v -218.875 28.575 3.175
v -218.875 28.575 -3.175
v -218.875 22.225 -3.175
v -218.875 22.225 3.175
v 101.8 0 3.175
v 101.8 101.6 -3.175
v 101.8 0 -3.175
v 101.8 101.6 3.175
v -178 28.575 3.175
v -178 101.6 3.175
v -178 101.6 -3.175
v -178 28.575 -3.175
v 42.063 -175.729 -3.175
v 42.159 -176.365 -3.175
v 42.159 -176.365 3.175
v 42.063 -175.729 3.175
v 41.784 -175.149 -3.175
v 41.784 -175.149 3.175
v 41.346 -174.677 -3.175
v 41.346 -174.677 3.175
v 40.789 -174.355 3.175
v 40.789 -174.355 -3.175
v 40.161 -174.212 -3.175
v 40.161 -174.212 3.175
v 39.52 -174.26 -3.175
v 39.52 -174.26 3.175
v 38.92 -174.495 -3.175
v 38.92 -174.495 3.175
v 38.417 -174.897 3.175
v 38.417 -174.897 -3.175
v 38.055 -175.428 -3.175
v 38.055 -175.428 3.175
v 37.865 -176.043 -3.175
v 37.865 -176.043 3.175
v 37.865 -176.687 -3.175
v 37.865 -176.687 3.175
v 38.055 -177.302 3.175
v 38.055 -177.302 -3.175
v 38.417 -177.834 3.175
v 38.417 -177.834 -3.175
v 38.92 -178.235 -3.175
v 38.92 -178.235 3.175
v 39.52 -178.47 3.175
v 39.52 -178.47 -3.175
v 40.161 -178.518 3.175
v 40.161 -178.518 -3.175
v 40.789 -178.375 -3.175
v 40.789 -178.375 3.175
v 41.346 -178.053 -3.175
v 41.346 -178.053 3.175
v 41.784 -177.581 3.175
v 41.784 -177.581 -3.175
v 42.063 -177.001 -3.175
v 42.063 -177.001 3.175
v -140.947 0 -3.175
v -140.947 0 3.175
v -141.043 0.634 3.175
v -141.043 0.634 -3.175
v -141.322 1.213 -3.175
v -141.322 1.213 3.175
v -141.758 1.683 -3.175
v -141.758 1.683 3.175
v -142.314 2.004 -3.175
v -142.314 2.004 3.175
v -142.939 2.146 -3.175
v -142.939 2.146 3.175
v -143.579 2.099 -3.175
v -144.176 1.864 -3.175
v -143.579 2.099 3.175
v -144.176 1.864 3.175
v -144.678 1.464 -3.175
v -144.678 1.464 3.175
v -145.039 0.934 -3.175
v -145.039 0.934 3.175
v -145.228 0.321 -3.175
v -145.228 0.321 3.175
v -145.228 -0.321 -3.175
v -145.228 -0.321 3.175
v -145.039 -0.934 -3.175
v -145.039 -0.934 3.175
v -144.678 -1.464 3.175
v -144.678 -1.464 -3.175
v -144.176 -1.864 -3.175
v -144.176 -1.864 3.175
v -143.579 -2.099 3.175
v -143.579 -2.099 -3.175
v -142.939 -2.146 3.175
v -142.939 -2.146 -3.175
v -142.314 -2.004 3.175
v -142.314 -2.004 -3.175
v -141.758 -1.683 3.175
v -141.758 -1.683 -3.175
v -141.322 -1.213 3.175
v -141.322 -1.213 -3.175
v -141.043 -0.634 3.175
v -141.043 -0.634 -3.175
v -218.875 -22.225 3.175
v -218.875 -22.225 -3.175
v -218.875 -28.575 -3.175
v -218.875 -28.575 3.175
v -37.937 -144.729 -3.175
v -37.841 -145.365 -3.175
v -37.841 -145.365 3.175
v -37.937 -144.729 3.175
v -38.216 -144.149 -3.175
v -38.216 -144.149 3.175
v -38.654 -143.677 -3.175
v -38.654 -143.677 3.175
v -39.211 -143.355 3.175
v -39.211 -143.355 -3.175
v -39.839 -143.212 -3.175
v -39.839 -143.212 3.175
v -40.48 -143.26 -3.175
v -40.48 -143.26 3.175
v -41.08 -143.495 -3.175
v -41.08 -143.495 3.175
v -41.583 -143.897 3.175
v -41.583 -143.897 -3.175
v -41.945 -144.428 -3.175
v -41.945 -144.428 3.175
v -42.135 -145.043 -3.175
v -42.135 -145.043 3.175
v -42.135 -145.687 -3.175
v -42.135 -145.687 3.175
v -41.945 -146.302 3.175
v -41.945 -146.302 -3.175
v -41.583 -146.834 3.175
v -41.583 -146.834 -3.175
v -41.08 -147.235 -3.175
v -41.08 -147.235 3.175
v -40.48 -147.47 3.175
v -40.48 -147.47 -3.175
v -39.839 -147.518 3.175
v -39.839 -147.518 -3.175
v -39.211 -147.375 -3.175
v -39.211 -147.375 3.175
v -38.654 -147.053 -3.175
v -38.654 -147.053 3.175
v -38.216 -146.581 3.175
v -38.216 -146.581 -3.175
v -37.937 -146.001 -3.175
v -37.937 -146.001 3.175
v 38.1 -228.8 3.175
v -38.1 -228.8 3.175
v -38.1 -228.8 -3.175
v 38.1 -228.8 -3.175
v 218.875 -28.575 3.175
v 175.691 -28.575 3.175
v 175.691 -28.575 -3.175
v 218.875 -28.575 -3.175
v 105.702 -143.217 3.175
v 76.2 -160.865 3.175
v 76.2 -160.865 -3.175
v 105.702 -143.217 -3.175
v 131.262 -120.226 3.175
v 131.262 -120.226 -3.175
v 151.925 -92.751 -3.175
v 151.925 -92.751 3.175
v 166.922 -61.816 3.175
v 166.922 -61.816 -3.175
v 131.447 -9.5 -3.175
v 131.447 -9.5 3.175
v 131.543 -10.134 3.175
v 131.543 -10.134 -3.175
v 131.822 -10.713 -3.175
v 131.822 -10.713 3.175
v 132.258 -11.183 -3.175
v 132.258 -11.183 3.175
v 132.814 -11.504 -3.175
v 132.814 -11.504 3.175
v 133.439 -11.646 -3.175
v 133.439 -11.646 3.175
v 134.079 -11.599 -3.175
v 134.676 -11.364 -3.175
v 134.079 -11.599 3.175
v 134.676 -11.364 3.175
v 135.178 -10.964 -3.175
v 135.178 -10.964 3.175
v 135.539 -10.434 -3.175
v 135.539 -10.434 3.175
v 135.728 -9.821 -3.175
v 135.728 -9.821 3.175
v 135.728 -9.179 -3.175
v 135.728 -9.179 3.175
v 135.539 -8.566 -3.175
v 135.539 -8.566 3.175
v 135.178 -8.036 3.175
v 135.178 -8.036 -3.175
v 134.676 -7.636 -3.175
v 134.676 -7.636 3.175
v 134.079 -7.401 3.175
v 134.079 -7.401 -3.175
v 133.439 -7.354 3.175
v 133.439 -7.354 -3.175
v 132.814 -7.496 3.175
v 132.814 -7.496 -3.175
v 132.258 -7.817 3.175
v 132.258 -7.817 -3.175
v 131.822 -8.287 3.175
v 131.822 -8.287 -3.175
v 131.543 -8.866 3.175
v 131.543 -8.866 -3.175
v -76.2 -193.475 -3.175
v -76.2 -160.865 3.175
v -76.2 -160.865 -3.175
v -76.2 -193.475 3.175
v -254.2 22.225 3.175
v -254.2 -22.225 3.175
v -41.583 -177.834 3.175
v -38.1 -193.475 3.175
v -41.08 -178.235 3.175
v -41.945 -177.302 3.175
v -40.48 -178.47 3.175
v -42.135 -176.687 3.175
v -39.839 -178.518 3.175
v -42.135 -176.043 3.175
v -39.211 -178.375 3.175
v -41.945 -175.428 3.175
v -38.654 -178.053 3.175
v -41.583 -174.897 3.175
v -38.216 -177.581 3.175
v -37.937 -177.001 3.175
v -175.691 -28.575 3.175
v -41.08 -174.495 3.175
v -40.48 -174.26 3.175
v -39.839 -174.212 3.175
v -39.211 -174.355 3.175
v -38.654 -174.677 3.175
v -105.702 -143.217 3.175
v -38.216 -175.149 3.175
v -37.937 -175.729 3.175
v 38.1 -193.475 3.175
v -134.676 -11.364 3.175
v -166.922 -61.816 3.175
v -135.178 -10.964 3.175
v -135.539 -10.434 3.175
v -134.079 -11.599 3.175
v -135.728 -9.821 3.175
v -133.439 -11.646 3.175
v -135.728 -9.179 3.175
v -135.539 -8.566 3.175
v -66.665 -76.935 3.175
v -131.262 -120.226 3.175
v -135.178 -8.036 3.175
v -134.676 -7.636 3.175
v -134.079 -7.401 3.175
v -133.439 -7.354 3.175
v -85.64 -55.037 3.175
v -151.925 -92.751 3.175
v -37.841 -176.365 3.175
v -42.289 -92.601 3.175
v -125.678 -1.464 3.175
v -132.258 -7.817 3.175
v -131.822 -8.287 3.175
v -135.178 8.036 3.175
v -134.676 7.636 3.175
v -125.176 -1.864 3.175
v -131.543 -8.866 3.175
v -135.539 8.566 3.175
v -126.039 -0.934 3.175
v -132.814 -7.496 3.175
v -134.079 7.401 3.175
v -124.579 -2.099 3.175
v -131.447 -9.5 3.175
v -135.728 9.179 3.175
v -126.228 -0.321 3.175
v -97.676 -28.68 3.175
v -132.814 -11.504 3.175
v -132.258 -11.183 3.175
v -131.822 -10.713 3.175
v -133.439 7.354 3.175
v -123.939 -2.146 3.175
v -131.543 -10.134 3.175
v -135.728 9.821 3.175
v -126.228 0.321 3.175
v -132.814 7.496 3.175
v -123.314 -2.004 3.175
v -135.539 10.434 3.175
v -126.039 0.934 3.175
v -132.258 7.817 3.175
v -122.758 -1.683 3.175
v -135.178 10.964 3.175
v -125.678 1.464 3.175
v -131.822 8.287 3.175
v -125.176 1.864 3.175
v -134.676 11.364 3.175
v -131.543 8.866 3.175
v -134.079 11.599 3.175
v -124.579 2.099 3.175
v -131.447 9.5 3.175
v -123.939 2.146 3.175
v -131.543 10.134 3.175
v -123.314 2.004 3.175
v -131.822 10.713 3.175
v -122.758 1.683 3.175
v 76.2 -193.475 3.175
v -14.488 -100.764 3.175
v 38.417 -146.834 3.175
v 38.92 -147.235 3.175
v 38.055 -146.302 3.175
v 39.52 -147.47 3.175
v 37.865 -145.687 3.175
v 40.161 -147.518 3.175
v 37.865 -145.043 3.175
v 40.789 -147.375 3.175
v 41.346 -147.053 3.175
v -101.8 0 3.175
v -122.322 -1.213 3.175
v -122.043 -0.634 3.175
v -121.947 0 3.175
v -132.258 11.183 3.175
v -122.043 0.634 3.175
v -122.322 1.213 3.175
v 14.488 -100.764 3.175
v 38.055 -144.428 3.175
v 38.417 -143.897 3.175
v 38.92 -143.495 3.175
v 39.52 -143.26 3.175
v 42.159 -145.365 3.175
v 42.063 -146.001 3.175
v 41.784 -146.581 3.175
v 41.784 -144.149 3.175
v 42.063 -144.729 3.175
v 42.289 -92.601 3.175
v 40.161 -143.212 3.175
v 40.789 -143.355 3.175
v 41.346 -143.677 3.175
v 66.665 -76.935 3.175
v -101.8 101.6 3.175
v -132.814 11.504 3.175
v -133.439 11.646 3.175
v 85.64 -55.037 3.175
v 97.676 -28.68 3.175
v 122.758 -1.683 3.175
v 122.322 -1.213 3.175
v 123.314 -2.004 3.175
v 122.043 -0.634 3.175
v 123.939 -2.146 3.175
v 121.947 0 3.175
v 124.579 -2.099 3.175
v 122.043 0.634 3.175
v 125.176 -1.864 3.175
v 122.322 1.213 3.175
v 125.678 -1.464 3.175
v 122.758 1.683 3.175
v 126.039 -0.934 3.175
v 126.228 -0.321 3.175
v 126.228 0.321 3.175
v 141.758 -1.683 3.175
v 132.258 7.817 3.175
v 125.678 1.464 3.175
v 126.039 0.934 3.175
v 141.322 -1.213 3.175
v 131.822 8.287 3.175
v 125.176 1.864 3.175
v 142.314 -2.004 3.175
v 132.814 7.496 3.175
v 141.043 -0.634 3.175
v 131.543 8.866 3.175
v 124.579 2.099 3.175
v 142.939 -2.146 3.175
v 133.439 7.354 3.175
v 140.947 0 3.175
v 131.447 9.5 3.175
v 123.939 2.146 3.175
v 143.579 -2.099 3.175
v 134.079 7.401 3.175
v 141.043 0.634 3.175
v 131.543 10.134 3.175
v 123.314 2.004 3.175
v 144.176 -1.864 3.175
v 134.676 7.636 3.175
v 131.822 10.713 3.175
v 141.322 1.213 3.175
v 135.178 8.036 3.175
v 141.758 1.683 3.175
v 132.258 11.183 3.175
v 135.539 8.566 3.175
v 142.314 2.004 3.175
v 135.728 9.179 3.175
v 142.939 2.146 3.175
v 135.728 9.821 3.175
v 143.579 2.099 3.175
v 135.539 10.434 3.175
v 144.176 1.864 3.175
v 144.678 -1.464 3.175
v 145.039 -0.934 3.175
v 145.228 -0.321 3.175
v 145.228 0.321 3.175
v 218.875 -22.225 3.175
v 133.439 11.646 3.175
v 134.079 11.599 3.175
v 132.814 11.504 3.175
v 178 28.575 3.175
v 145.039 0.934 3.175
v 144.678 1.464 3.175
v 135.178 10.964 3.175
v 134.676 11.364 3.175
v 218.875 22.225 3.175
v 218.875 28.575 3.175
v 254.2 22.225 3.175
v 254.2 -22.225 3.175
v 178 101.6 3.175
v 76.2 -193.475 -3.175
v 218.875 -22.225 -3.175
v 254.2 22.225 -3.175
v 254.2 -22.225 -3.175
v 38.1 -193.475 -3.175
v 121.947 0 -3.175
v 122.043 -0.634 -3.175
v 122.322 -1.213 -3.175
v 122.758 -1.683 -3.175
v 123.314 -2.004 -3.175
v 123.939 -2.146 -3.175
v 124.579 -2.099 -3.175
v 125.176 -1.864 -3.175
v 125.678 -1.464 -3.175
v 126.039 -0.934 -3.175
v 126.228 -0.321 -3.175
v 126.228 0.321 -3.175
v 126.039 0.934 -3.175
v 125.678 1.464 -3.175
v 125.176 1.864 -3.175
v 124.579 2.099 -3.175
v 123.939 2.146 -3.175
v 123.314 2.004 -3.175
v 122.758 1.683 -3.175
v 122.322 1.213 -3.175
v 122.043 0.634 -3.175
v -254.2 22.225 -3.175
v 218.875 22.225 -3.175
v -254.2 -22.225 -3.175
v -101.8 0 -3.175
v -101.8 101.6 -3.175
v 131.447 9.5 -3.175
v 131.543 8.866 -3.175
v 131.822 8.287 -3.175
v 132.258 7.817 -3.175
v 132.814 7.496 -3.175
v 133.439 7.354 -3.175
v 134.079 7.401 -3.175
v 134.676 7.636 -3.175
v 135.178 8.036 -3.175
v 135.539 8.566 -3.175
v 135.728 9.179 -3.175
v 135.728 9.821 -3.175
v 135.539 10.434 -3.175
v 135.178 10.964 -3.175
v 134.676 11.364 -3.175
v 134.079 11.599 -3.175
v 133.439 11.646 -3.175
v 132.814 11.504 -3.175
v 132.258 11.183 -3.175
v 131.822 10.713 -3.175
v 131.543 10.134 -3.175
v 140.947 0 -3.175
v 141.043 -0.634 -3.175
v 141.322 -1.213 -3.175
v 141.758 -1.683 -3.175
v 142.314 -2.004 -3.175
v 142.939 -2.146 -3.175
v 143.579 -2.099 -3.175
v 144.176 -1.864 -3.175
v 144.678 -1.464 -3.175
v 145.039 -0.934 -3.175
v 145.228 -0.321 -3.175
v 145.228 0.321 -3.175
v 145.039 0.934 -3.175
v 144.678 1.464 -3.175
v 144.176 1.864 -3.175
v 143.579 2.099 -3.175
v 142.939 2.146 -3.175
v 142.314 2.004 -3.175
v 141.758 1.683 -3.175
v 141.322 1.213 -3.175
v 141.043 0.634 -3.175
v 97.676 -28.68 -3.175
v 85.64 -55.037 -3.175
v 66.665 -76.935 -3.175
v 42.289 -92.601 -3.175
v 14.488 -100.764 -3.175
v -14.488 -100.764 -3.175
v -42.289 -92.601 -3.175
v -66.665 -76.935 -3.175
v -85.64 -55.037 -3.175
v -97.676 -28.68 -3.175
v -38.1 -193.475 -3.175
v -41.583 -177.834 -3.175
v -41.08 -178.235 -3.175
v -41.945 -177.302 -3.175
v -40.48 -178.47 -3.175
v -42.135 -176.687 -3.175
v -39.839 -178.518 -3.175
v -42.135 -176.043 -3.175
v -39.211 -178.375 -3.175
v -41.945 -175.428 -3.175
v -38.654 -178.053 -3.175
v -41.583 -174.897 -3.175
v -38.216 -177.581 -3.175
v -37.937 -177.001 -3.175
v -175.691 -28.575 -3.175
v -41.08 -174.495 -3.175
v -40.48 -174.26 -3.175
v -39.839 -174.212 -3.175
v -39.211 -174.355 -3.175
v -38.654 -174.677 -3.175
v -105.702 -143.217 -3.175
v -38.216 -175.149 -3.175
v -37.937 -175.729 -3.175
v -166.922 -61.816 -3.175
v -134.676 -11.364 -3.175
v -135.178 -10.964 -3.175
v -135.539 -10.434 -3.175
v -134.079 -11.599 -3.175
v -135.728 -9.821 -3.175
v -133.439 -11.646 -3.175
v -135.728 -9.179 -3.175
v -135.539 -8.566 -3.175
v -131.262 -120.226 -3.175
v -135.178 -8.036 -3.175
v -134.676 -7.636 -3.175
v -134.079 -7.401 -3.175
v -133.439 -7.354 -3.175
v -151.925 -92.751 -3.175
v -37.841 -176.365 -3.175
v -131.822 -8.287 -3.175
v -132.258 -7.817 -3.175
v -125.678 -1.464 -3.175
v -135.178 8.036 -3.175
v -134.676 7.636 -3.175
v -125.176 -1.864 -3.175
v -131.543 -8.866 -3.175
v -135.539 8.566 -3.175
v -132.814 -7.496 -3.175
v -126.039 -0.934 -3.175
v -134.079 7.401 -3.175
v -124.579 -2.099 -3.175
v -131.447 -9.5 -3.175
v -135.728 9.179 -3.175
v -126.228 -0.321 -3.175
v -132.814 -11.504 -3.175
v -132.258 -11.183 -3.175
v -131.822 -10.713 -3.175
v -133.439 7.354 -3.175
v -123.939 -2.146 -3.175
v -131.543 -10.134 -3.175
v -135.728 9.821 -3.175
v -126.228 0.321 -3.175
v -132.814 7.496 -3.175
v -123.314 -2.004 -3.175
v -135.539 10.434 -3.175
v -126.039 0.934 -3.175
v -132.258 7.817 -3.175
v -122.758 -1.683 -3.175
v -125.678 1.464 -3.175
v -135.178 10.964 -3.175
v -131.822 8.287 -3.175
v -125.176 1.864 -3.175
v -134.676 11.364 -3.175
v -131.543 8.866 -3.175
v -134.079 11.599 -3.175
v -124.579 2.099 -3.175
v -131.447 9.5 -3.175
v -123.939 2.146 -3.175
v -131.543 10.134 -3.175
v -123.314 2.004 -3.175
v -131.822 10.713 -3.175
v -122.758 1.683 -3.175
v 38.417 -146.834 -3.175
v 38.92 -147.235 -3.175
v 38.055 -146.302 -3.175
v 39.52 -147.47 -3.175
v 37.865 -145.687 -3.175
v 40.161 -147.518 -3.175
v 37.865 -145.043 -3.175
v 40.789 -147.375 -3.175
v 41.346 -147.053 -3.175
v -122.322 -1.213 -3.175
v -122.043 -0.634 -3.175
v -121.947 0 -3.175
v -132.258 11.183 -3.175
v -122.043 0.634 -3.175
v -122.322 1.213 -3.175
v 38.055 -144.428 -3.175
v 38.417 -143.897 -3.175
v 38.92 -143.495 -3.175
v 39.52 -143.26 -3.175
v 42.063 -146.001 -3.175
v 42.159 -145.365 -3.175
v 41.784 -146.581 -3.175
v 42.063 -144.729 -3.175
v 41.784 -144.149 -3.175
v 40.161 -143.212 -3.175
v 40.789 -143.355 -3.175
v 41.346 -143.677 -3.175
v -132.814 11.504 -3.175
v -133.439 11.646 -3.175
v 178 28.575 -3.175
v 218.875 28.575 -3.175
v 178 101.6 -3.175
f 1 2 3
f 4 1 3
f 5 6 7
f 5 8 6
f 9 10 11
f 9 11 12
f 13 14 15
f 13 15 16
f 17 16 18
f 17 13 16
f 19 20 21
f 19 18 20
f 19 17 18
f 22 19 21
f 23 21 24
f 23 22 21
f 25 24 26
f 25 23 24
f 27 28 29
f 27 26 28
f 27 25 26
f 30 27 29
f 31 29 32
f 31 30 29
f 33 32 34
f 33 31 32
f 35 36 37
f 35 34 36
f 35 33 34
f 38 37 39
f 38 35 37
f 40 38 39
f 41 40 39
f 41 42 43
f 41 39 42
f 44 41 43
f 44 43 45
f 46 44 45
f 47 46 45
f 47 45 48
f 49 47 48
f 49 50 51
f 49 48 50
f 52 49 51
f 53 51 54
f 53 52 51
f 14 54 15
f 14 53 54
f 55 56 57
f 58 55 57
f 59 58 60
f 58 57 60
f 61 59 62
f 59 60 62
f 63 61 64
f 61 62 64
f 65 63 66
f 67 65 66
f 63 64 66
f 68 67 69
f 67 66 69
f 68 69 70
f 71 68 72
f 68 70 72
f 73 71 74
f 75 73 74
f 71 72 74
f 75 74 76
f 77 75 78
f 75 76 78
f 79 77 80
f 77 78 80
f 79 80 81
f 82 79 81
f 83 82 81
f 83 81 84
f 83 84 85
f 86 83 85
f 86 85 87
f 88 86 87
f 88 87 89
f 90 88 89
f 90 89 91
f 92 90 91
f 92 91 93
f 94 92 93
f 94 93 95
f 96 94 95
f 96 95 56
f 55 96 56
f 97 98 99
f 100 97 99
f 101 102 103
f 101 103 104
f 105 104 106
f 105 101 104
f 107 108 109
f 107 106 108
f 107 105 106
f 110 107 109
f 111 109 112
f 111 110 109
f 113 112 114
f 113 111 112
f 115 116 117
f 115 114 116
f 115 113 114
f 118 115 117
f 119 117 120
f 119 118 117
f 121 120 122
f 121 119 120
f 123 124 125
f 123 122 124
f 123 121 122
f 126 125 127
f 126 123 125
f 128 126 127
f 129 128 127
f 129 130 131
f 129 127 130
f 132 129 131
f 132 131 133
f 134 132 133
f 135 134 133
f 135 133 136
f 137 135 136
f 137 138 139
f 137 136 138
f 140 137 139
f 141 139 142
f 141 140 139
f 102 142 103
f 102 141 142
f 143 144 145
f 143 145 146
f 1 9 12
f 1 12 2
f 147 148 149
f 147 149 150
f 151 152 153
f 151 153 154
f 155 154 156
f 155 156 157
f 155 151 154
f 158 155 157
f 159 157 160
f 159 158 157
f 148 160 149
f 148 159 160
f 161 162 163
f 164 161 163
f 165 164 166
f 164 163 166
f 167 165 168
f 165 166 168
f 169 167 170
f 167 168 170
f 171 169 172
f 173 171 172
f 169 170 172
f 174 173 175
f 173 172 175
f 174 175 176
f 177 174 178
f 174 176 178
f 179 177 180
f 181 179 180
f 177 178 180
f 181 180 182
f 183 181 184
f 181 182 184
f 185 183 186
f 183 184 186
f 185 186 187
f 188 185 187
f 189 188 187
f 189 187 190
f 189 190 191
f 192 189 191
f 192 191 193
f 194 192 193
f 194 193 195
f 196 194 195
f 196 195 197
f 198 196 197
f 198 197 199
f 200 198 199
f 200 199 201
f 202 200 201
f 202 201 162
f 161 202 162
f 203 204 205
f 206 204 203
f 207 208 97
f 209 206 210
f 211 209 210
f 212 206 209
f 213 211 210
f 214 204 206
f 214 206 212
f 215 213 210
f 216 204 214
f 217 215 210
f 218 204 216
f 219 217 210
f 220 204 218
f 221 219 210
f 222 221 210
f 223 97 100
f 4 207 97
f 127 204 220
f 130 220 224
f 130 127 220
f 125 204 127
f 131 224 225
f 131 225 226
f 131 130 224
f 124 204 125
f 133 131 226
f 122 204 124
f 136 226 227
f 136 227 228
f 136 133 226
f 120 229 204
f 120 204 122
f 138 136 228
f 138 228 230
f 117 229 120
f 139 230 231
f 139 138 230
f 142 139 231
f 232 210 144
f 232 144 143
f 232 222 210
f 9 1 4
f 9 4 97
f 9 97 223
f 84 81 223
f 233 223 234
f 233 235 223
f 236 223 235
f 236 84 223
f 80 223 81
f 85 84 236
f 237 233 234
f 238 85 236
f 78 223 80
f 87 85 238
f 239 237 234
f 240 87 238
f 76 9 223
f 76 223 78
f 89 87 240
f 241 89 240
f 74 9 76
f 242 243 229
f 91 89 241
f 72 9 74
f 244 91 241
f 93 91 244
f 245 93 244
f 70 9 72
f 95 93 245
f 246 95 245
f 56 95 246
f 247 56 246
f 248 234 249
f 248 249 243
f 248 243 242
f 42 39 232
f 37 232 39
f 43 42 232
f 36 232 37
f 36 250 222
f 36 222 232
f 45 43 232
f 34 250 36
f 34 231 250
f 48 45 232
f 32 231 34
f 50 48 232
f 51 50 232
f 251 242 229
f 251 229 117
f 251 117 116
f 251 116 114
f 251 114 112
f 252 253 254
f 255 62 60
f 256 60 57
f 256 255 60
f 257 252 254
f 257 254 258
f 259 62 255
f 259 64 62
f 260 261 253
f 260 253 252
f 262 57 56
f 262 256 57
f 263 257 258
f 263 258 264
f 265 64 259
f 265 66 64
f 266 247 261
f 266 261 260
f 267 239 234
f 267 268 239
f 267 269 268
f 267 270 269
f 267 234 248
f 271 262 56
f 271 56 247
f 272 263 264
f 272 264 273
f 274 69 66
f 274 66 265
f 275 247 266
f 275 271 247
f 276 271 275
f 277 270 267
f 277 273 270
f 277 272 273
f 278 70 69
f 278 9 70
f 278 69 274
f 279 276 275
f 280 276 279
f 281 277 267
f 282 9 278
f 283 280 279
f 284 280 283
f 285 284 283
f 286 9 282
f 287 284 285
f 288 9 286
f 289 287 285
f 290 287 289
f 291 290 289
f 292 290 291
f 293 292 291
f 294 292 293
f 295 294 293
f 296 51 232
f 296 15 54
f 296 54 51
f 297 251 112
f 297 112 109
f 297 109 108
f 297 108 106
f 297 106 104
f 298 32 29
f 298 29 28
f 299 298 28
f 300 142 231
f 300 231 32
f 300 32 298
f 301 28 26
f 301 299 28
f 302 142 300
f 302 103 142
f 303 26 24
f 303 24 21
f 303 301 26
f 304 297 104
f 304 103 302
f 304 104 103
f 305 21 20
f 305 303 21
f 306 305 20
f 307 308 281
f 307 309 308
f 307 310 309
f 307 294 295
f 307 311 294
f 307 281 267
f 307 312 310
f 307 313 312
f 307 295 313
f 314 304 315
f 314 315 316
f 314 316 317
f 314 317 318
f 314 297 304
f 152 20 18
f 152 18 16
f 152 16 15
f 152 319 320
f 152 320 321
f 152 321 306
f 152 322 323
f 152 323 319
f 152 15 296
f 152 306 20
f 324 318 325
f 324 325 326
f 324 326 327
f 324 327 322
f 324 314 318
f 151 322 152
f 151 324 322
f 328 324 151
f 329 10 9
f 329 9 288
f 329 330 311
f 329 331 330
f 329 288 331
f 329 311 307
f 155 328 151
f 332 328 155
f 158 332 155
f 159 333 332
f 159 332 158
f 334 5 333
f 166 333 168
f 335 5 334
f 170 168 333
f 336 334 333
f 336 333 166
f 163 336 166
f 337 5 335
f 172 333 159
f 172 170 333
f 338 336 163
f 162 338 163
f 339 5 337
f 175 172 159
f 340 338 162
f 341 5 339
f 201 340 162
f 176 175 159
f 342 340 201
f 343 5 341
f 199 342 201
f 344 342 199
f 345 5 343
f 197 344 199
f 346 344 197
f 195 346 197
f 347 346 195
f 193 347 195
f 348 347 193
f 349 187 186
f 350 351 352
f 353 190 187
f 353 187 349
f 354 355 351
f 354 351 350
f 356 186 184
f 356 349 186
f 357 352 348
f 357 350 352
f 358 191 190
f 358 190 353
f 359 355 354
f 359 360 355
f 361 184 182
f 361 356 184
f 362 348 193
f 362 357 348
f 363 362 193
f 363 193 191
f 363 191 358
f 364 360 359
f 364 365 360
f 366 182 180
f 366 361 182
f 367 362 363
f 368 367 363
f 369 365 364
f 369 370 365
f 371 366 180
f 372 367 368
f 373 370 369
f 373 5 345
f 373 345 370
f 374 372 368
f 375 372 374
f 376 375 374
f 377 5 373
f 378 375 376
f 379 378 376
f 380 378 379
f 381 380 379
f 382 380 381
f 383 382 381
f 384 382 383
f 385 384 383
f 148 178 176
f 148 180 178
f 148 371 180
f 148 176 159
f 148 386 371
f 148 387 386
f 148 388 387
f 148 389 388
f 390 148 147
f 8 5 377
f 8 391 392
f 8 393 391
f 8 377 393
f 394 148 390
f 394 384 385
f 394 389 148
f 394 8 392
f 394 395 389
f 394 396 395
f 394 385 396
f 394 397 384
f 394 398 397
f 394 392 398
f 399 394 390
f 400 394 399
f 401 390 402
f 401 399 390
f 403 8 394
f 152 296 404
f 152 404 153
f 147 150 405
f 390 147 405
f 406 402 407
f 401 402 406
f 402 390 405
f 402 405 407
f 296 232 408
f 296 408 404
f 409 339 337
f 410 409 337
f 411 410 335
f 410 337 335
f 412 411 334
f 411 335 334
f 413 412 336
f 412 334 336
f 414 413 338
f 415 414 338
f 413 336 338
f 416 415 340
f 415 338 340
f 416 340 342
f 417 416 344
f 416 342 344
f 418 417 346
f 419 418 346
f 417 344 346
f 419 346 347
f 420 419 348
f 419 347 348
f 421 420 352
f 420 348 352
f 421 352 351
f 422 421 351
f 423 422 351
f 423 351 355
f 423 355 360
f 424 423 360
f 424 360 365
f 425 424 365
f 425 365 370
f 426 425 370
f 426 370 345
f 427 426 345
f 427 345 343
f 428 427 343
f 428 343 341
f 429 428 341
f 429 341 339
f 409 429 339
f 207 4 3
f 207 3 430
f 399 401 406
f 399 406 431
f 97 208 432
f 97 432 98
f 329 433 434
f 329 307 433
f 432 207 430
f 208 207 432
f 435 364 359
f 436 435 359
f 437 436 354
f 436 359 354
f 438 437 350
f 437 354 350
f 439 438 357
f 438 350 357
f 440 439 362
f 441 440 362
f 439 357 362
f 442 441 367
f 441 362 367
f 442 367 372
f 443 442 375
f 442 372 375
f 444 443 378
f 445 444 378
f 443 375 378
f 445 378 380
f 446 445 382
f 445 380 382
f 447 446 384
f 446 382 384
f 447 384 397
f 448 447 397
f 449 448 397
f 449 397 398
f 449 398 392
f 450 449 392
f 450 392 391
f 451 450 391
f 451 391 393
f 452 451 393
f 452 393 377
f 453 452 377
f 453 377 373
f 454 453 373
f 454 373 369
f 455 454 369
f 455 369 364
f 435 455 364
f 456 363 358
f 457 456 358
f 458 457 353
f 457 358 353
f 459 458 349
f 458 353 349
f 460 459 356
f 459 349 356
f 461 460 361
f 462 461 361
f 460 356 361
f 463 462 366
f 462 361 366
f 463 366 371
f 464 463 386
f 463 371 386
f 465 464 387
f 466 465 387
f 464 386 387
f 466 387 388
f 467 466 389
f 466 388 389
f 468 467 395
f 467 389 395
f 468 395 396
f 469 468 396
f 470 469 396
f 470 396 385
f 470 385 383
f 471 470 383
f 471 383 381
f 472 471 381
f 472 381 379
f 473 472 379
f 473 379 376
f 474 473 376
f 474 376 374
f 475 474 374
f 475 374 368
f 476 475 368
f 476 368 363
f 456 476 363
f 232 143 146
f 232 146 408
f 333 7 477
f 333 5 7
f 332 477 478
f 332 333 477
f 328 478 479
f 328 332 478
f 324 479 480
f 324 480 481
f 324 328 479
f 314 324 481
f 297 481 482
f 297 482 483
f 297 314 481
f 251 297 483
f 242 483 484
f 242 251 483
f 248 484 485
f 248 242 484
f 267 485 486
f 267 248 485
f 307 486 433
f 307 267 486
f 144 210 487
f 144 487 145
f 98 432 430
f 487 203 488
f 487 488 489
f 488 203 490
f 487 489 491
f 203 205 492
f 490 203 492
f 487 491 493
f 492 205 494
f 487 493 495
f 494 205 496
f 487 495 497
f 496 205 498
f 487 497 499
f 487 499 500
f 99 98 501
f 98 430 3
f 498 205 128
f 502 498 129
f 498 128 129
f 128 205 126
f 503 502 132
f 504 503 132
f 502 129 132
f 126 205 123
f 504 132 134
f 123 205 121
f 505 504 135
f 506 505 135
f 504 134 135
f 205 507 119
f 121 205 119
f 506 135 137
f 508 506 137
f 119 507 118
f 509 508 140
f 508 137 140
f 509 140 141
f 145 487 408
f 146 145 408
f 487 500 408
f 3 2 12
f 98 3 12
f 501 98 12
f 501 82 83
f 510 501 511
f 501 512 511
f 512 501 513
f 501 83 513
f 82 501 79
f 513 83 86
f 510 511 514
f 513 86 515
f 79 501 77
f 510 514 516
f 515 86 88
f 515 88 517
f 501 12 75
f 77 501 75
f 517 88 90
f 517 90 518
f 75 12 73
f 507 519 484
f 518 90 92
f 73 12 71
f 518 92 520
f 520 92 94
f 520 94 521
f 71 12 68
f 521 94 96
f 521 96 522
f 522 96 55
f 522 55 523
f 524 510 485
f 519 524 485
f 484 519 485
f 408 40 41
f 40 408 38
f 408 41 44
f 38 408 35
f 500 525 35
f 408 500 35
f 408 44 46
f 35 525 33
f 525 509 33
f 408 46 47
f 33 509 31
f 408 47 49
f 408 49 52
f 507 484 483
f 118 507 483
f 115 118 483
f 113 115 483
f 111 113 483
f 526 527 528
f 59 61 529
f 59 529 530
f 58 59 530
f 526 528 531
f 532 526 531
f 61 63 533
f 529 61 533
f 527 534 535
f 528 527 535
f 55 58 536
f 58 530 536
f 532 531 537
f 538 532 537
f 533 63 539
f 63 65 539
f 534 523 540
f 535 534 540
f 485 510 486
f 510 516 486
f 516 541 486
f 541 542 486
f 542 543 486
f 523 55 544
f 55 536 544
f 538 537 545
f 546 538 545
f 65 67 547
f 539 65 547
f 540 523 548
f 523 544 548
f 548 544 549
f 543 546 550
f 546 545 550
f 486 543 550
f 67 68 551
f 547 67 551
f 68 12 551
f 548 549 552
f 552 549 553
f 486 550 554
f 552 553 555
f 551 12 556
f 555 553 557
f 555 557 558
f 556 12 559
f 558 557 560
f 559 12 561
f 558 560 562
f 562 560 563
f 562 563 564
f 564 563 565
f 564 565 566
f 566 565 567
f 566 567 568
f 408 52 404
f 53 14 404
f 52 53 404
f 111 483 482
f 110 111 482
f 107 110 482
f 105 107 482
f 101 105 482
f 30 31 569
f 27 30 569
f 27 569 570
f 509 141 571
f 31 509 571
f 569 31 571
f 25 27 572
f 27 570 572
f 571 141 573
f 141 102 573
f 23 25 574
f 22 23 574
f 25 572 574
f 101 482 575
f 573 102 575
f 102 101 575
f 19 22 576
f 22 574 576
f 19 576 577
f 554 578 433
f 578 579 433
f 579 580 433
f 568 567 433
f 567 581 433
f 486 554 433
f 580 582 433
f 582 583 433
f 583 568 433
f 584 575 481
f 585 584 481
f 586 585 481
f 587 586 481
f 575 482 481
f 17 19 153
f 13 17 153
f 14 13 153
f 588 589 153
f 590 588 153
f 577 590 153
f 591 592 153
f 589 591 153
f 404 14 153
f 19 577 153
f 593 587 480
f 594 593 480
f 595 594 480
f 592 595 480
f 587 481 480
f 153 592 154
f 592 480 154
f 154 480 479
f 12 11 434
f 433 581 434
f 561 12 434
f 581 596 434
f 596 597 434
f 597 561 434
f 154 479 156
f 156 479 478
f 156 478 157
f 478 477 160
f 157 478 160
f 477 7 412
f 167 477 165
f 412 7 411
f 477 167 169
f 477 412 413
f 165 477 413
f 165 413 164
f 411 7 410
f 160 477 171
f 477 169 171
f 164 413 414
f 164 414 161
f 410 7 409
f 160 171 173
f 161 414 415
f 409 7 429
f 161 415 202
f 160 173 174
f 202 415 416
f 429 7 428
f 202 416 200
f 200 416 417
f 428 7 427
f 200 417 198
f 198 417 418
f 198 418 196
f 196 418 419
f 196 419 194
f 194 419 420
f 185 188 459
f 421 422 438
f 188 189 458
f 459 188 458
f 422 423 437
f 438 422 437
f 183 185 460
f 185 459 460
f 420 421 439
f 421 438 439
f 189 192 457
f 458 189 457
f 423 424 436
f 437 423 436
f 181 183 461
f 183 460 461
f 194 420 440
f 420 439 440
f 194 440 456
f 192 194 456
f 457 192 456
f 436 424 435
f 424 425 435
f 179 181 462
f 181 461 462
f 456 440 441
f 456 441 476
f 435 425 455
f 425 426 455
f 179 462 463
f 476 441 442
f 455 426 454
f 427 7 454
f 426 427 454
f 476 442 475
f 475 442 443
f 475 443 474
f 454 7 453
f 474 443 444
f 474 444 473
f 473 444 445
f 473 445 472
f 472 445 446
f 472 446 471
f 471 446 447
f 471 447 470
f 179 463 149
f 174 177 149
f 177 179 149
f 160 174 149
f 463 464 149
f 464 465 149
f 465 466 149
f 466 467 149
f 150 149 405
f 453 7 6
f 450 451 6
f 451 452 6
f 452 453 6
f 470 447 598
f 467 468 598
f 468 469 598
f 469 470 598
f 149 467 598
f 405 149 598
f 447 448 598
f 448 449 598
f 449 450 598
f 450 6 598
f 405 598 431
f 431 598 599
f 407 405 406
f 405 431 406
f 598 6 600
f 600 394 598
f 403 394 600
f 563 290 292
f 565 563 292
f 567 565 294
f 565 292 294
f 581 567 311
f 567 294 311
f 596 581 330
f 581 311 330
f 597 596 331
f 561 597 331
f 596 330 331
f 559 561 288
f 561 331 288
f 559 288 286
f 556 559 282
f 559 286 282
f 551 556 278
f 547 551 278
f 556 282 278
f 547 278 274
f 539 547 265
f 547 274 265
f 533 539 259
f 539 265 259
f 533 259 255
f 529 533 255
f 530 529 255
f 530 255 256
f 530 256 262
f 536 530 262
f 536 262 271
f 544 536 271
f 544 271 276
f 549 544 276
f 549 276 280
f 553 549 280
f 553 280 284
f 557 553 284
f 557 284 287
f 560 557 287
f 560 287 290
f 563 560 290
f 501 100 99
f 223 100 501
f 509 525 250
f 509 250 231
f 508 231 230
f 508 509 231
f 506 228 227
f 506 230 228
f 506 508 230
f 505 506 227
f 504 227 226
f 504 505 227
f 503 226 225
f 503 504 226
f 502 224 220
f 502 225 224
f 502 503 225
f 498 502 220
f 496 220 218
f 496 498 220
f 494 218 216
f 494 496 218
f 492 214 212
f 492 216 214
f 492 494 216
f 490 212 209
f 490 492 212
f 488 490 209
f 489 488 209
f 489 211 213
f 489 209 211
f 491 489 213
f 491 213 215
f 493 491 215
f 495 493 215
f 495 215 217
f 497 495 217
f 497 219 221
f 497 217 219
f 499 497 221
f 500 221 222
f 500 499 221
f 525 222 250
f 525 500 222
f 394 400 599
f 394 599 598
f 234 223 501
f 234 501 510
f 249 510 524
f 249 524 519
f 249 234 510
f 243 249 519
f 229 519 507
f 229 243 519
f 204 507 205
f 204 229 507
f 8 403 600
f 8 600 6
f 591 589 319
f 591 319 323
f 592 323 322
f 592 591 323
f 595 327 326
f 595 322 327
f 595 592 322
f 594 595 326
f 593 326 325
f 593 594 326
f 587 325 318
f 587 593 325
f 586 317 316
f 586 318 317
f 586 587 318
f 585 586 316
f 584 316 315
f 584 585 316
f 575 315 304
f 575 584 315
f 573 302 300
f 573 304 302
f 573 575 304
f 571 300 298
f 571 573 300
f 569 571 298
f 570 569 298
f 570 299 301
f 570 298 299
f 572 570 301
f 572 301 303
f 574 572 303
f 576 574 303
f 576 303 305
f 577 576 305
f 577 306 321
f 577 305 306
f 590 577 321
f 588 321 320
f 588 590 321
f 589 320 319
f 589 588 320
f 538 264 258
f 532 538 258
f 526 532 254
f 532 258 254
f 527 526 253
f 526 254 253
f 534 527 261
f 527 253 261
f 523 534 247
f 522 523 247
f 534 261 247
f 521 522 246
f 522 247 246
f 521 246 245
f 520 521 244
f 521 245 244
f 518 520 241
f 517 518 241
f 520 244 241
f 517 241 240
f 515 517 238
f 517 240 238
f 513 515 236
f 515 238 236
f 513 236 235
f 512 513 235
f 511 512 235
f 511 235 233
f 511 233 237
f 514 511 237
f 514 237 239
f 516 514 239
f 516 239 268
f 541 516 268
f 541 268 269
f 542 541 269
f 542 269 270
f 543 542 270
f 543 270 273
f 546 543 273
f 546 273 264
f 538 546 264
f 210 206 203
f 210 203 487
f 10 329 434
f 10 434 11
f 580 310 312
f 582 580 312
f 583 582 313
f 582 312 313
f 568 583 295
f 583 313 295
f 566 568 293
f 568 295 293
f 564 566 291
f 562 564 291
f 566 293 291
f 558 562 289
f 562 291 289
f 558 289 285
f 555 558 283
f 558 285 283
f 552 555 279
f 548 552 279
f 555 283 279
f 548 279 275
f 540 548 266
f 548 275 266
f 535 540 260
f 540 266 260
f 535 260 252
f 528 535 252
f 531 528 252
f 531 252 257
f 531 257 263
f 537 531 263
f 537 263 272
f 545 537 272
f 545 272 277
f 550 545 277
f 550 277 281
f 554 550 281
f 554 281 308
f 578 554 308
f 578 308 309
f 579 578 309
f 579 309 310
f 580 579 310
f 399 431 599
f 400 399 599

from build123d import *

# Parameters (mm, degrees)
BOSS_EXTRUDE1_DEPTH     = 3.175
SKETCH3_R               = 2.152500013
CUT_EXTRUDE2_DEPTH      = 343.063448214
CUT_EXTRUDE3_DEPTH      = 343.019240291
CUT_EXTRUDE3_DEPTH_BACK = 343.019240291
SKETCH4_R               = 2.159


with BuildPart() as part:
    # Sketch1 → Boss-Extrude1 (new, symmetric)
    with BuildSketch(Plane.XY):
        with BuildLine():
            Line((-101.800000108, 0), (-101.800000108, 101.6))
            Line((-101.800000108, 101.6), (-178.000000108, 101.6))
            Line((-178.000000108, 101.6), (-178.000000108, 28.575))
            Line((-178.000000108, 28.575), (-218.874999892, 28.575))
            Line((-218.874999892, 28.575), (-218.874999892, 22.225))
            Line((-218.874999892, 22.225), (-254.200000108, 22.225))
            Line((-254.200000108, 22.225), (-254.200000108, -22.225))
            Line((-254.200000108, -22.225), (-218.874999892, -22.225))
            Line((-218.874999892, -22.225), (-218.874999892, -28.575))
            Line((-218.874999892, -28.575), (-175.691403926, -28.575))
            ThreePointArc((-175.691403926, -28.575), (-142.258508697, -106.98839536), (-76.2, -160.865036719))
            Line((-76.2, -160.865036719), (-76.2, -193.474999892))
            Line((-76.2, -193.474999892), (-38.1, -193.474999892))
            Line((-38.1, -193.474999892), (-38.1, -228.800000108))
            Line((-38.1, -228.800000108), (38.1, -228.800000108))
            Line((38.1, -228.800000108), (38.1, -193.474999892))
            Line((38.1, -193.474999892), (76.2, -193.474999892))
            Line((76.2, -193.474999892), (76.2, -160.865036719))
            ThreePointArc((76.2, -160.865036719), (142.258508697, -106.98839536), (175.691403926, -28.575))
            Line((175.691403926, -28.575), (218.874999892, -28.575))
            Line((218.874999892, -28.575), (218.874999892, -22.225))
            Line((218.874999892, -22.225), (254.200000108, -22.225))
            Line((254.200000108, -22.225), (254.200000108, 22.225))
            Line((254.200000108, 22.225), (218.874999892, 22.225))
            Line((218.874999892, 22.225), (218.874999892, 28.575))
            Line((218.874999892, 28.575), (178.000000108, 28.575))
            Line((178.000000108, 28.575), (178.000000108, 101.6))
            Line((178.000000108, 101.6), (101.800000108, 101.6))
            Line((101.800000108, 101.6), (101.800000108, 0))
            ThreePointArc((101.800000108, 0), (0, -101.800000108), (-101.800000108, 0))
        make_face()
    extrude(amount=BOSS_EXTRUDE1_DEPTH, both=True)

    # Sketch3 → Cut-Extrude2 (cut, through all)
    with BuildSketch(Plane.XY.offset(3.175)):
        with Locations((-133.6, 9.5)):
            Circle(SKETCH3_R)
        with Locations((-124.1, 0)):
            Circle(SKETCH3_R)
        with Locations((-143.1, 0)):
            Circle(SKETCH3_R)
        with Locations((-133.6, -9.5)):
            Circle(SKETCH3_R)
        with Locations(Location((133.6, -9.5, 0), (0, 0, 180))):
            Circle(SKETCH3_R)
        with Locations(Location((143.1, 0, 0), (0, 0, 180))):
            Circle(SKETCH3_R)
        with Locations(Location((124.1, 0, 0), (0, 0, 180))):
            Circle(SKETCH3_R)
        with Locations(Location((133.6, 9.5, 0), (0, 0, 180))):
            Circle(SKETCH3_R)
    extrude(amount=-CUT_EXTRUDE2_DEPTH, mode=Mode.SUBTRACT)

    # Sketch4 → Cut-Extrude3 (cut, two sides: drawn at the far end of the back side and taken through both)
    with BuildSketch(Plane.XY.offset(-CUT_EXTRUDE3_DEPTH_BACK)):
        with Locations((40, -145.365036719)):
            Circle(SKETCH4_R)
        with Locations((-40, -145.365036719)):
            Circle(SKETCH4_R)
        with Locations((-40, -176.365036719)):
            Circle(SKETCH4_R)
        with Locations((40, -176.365036719)):
            Circle(SKETCH4_R)
    extrude(amount=CUT_EXTRUDE3_DEPTH + CUT_EXTRUDE3_DEPTH_BACK, mode=Mode.SUBTRACT)


solid = part.part
